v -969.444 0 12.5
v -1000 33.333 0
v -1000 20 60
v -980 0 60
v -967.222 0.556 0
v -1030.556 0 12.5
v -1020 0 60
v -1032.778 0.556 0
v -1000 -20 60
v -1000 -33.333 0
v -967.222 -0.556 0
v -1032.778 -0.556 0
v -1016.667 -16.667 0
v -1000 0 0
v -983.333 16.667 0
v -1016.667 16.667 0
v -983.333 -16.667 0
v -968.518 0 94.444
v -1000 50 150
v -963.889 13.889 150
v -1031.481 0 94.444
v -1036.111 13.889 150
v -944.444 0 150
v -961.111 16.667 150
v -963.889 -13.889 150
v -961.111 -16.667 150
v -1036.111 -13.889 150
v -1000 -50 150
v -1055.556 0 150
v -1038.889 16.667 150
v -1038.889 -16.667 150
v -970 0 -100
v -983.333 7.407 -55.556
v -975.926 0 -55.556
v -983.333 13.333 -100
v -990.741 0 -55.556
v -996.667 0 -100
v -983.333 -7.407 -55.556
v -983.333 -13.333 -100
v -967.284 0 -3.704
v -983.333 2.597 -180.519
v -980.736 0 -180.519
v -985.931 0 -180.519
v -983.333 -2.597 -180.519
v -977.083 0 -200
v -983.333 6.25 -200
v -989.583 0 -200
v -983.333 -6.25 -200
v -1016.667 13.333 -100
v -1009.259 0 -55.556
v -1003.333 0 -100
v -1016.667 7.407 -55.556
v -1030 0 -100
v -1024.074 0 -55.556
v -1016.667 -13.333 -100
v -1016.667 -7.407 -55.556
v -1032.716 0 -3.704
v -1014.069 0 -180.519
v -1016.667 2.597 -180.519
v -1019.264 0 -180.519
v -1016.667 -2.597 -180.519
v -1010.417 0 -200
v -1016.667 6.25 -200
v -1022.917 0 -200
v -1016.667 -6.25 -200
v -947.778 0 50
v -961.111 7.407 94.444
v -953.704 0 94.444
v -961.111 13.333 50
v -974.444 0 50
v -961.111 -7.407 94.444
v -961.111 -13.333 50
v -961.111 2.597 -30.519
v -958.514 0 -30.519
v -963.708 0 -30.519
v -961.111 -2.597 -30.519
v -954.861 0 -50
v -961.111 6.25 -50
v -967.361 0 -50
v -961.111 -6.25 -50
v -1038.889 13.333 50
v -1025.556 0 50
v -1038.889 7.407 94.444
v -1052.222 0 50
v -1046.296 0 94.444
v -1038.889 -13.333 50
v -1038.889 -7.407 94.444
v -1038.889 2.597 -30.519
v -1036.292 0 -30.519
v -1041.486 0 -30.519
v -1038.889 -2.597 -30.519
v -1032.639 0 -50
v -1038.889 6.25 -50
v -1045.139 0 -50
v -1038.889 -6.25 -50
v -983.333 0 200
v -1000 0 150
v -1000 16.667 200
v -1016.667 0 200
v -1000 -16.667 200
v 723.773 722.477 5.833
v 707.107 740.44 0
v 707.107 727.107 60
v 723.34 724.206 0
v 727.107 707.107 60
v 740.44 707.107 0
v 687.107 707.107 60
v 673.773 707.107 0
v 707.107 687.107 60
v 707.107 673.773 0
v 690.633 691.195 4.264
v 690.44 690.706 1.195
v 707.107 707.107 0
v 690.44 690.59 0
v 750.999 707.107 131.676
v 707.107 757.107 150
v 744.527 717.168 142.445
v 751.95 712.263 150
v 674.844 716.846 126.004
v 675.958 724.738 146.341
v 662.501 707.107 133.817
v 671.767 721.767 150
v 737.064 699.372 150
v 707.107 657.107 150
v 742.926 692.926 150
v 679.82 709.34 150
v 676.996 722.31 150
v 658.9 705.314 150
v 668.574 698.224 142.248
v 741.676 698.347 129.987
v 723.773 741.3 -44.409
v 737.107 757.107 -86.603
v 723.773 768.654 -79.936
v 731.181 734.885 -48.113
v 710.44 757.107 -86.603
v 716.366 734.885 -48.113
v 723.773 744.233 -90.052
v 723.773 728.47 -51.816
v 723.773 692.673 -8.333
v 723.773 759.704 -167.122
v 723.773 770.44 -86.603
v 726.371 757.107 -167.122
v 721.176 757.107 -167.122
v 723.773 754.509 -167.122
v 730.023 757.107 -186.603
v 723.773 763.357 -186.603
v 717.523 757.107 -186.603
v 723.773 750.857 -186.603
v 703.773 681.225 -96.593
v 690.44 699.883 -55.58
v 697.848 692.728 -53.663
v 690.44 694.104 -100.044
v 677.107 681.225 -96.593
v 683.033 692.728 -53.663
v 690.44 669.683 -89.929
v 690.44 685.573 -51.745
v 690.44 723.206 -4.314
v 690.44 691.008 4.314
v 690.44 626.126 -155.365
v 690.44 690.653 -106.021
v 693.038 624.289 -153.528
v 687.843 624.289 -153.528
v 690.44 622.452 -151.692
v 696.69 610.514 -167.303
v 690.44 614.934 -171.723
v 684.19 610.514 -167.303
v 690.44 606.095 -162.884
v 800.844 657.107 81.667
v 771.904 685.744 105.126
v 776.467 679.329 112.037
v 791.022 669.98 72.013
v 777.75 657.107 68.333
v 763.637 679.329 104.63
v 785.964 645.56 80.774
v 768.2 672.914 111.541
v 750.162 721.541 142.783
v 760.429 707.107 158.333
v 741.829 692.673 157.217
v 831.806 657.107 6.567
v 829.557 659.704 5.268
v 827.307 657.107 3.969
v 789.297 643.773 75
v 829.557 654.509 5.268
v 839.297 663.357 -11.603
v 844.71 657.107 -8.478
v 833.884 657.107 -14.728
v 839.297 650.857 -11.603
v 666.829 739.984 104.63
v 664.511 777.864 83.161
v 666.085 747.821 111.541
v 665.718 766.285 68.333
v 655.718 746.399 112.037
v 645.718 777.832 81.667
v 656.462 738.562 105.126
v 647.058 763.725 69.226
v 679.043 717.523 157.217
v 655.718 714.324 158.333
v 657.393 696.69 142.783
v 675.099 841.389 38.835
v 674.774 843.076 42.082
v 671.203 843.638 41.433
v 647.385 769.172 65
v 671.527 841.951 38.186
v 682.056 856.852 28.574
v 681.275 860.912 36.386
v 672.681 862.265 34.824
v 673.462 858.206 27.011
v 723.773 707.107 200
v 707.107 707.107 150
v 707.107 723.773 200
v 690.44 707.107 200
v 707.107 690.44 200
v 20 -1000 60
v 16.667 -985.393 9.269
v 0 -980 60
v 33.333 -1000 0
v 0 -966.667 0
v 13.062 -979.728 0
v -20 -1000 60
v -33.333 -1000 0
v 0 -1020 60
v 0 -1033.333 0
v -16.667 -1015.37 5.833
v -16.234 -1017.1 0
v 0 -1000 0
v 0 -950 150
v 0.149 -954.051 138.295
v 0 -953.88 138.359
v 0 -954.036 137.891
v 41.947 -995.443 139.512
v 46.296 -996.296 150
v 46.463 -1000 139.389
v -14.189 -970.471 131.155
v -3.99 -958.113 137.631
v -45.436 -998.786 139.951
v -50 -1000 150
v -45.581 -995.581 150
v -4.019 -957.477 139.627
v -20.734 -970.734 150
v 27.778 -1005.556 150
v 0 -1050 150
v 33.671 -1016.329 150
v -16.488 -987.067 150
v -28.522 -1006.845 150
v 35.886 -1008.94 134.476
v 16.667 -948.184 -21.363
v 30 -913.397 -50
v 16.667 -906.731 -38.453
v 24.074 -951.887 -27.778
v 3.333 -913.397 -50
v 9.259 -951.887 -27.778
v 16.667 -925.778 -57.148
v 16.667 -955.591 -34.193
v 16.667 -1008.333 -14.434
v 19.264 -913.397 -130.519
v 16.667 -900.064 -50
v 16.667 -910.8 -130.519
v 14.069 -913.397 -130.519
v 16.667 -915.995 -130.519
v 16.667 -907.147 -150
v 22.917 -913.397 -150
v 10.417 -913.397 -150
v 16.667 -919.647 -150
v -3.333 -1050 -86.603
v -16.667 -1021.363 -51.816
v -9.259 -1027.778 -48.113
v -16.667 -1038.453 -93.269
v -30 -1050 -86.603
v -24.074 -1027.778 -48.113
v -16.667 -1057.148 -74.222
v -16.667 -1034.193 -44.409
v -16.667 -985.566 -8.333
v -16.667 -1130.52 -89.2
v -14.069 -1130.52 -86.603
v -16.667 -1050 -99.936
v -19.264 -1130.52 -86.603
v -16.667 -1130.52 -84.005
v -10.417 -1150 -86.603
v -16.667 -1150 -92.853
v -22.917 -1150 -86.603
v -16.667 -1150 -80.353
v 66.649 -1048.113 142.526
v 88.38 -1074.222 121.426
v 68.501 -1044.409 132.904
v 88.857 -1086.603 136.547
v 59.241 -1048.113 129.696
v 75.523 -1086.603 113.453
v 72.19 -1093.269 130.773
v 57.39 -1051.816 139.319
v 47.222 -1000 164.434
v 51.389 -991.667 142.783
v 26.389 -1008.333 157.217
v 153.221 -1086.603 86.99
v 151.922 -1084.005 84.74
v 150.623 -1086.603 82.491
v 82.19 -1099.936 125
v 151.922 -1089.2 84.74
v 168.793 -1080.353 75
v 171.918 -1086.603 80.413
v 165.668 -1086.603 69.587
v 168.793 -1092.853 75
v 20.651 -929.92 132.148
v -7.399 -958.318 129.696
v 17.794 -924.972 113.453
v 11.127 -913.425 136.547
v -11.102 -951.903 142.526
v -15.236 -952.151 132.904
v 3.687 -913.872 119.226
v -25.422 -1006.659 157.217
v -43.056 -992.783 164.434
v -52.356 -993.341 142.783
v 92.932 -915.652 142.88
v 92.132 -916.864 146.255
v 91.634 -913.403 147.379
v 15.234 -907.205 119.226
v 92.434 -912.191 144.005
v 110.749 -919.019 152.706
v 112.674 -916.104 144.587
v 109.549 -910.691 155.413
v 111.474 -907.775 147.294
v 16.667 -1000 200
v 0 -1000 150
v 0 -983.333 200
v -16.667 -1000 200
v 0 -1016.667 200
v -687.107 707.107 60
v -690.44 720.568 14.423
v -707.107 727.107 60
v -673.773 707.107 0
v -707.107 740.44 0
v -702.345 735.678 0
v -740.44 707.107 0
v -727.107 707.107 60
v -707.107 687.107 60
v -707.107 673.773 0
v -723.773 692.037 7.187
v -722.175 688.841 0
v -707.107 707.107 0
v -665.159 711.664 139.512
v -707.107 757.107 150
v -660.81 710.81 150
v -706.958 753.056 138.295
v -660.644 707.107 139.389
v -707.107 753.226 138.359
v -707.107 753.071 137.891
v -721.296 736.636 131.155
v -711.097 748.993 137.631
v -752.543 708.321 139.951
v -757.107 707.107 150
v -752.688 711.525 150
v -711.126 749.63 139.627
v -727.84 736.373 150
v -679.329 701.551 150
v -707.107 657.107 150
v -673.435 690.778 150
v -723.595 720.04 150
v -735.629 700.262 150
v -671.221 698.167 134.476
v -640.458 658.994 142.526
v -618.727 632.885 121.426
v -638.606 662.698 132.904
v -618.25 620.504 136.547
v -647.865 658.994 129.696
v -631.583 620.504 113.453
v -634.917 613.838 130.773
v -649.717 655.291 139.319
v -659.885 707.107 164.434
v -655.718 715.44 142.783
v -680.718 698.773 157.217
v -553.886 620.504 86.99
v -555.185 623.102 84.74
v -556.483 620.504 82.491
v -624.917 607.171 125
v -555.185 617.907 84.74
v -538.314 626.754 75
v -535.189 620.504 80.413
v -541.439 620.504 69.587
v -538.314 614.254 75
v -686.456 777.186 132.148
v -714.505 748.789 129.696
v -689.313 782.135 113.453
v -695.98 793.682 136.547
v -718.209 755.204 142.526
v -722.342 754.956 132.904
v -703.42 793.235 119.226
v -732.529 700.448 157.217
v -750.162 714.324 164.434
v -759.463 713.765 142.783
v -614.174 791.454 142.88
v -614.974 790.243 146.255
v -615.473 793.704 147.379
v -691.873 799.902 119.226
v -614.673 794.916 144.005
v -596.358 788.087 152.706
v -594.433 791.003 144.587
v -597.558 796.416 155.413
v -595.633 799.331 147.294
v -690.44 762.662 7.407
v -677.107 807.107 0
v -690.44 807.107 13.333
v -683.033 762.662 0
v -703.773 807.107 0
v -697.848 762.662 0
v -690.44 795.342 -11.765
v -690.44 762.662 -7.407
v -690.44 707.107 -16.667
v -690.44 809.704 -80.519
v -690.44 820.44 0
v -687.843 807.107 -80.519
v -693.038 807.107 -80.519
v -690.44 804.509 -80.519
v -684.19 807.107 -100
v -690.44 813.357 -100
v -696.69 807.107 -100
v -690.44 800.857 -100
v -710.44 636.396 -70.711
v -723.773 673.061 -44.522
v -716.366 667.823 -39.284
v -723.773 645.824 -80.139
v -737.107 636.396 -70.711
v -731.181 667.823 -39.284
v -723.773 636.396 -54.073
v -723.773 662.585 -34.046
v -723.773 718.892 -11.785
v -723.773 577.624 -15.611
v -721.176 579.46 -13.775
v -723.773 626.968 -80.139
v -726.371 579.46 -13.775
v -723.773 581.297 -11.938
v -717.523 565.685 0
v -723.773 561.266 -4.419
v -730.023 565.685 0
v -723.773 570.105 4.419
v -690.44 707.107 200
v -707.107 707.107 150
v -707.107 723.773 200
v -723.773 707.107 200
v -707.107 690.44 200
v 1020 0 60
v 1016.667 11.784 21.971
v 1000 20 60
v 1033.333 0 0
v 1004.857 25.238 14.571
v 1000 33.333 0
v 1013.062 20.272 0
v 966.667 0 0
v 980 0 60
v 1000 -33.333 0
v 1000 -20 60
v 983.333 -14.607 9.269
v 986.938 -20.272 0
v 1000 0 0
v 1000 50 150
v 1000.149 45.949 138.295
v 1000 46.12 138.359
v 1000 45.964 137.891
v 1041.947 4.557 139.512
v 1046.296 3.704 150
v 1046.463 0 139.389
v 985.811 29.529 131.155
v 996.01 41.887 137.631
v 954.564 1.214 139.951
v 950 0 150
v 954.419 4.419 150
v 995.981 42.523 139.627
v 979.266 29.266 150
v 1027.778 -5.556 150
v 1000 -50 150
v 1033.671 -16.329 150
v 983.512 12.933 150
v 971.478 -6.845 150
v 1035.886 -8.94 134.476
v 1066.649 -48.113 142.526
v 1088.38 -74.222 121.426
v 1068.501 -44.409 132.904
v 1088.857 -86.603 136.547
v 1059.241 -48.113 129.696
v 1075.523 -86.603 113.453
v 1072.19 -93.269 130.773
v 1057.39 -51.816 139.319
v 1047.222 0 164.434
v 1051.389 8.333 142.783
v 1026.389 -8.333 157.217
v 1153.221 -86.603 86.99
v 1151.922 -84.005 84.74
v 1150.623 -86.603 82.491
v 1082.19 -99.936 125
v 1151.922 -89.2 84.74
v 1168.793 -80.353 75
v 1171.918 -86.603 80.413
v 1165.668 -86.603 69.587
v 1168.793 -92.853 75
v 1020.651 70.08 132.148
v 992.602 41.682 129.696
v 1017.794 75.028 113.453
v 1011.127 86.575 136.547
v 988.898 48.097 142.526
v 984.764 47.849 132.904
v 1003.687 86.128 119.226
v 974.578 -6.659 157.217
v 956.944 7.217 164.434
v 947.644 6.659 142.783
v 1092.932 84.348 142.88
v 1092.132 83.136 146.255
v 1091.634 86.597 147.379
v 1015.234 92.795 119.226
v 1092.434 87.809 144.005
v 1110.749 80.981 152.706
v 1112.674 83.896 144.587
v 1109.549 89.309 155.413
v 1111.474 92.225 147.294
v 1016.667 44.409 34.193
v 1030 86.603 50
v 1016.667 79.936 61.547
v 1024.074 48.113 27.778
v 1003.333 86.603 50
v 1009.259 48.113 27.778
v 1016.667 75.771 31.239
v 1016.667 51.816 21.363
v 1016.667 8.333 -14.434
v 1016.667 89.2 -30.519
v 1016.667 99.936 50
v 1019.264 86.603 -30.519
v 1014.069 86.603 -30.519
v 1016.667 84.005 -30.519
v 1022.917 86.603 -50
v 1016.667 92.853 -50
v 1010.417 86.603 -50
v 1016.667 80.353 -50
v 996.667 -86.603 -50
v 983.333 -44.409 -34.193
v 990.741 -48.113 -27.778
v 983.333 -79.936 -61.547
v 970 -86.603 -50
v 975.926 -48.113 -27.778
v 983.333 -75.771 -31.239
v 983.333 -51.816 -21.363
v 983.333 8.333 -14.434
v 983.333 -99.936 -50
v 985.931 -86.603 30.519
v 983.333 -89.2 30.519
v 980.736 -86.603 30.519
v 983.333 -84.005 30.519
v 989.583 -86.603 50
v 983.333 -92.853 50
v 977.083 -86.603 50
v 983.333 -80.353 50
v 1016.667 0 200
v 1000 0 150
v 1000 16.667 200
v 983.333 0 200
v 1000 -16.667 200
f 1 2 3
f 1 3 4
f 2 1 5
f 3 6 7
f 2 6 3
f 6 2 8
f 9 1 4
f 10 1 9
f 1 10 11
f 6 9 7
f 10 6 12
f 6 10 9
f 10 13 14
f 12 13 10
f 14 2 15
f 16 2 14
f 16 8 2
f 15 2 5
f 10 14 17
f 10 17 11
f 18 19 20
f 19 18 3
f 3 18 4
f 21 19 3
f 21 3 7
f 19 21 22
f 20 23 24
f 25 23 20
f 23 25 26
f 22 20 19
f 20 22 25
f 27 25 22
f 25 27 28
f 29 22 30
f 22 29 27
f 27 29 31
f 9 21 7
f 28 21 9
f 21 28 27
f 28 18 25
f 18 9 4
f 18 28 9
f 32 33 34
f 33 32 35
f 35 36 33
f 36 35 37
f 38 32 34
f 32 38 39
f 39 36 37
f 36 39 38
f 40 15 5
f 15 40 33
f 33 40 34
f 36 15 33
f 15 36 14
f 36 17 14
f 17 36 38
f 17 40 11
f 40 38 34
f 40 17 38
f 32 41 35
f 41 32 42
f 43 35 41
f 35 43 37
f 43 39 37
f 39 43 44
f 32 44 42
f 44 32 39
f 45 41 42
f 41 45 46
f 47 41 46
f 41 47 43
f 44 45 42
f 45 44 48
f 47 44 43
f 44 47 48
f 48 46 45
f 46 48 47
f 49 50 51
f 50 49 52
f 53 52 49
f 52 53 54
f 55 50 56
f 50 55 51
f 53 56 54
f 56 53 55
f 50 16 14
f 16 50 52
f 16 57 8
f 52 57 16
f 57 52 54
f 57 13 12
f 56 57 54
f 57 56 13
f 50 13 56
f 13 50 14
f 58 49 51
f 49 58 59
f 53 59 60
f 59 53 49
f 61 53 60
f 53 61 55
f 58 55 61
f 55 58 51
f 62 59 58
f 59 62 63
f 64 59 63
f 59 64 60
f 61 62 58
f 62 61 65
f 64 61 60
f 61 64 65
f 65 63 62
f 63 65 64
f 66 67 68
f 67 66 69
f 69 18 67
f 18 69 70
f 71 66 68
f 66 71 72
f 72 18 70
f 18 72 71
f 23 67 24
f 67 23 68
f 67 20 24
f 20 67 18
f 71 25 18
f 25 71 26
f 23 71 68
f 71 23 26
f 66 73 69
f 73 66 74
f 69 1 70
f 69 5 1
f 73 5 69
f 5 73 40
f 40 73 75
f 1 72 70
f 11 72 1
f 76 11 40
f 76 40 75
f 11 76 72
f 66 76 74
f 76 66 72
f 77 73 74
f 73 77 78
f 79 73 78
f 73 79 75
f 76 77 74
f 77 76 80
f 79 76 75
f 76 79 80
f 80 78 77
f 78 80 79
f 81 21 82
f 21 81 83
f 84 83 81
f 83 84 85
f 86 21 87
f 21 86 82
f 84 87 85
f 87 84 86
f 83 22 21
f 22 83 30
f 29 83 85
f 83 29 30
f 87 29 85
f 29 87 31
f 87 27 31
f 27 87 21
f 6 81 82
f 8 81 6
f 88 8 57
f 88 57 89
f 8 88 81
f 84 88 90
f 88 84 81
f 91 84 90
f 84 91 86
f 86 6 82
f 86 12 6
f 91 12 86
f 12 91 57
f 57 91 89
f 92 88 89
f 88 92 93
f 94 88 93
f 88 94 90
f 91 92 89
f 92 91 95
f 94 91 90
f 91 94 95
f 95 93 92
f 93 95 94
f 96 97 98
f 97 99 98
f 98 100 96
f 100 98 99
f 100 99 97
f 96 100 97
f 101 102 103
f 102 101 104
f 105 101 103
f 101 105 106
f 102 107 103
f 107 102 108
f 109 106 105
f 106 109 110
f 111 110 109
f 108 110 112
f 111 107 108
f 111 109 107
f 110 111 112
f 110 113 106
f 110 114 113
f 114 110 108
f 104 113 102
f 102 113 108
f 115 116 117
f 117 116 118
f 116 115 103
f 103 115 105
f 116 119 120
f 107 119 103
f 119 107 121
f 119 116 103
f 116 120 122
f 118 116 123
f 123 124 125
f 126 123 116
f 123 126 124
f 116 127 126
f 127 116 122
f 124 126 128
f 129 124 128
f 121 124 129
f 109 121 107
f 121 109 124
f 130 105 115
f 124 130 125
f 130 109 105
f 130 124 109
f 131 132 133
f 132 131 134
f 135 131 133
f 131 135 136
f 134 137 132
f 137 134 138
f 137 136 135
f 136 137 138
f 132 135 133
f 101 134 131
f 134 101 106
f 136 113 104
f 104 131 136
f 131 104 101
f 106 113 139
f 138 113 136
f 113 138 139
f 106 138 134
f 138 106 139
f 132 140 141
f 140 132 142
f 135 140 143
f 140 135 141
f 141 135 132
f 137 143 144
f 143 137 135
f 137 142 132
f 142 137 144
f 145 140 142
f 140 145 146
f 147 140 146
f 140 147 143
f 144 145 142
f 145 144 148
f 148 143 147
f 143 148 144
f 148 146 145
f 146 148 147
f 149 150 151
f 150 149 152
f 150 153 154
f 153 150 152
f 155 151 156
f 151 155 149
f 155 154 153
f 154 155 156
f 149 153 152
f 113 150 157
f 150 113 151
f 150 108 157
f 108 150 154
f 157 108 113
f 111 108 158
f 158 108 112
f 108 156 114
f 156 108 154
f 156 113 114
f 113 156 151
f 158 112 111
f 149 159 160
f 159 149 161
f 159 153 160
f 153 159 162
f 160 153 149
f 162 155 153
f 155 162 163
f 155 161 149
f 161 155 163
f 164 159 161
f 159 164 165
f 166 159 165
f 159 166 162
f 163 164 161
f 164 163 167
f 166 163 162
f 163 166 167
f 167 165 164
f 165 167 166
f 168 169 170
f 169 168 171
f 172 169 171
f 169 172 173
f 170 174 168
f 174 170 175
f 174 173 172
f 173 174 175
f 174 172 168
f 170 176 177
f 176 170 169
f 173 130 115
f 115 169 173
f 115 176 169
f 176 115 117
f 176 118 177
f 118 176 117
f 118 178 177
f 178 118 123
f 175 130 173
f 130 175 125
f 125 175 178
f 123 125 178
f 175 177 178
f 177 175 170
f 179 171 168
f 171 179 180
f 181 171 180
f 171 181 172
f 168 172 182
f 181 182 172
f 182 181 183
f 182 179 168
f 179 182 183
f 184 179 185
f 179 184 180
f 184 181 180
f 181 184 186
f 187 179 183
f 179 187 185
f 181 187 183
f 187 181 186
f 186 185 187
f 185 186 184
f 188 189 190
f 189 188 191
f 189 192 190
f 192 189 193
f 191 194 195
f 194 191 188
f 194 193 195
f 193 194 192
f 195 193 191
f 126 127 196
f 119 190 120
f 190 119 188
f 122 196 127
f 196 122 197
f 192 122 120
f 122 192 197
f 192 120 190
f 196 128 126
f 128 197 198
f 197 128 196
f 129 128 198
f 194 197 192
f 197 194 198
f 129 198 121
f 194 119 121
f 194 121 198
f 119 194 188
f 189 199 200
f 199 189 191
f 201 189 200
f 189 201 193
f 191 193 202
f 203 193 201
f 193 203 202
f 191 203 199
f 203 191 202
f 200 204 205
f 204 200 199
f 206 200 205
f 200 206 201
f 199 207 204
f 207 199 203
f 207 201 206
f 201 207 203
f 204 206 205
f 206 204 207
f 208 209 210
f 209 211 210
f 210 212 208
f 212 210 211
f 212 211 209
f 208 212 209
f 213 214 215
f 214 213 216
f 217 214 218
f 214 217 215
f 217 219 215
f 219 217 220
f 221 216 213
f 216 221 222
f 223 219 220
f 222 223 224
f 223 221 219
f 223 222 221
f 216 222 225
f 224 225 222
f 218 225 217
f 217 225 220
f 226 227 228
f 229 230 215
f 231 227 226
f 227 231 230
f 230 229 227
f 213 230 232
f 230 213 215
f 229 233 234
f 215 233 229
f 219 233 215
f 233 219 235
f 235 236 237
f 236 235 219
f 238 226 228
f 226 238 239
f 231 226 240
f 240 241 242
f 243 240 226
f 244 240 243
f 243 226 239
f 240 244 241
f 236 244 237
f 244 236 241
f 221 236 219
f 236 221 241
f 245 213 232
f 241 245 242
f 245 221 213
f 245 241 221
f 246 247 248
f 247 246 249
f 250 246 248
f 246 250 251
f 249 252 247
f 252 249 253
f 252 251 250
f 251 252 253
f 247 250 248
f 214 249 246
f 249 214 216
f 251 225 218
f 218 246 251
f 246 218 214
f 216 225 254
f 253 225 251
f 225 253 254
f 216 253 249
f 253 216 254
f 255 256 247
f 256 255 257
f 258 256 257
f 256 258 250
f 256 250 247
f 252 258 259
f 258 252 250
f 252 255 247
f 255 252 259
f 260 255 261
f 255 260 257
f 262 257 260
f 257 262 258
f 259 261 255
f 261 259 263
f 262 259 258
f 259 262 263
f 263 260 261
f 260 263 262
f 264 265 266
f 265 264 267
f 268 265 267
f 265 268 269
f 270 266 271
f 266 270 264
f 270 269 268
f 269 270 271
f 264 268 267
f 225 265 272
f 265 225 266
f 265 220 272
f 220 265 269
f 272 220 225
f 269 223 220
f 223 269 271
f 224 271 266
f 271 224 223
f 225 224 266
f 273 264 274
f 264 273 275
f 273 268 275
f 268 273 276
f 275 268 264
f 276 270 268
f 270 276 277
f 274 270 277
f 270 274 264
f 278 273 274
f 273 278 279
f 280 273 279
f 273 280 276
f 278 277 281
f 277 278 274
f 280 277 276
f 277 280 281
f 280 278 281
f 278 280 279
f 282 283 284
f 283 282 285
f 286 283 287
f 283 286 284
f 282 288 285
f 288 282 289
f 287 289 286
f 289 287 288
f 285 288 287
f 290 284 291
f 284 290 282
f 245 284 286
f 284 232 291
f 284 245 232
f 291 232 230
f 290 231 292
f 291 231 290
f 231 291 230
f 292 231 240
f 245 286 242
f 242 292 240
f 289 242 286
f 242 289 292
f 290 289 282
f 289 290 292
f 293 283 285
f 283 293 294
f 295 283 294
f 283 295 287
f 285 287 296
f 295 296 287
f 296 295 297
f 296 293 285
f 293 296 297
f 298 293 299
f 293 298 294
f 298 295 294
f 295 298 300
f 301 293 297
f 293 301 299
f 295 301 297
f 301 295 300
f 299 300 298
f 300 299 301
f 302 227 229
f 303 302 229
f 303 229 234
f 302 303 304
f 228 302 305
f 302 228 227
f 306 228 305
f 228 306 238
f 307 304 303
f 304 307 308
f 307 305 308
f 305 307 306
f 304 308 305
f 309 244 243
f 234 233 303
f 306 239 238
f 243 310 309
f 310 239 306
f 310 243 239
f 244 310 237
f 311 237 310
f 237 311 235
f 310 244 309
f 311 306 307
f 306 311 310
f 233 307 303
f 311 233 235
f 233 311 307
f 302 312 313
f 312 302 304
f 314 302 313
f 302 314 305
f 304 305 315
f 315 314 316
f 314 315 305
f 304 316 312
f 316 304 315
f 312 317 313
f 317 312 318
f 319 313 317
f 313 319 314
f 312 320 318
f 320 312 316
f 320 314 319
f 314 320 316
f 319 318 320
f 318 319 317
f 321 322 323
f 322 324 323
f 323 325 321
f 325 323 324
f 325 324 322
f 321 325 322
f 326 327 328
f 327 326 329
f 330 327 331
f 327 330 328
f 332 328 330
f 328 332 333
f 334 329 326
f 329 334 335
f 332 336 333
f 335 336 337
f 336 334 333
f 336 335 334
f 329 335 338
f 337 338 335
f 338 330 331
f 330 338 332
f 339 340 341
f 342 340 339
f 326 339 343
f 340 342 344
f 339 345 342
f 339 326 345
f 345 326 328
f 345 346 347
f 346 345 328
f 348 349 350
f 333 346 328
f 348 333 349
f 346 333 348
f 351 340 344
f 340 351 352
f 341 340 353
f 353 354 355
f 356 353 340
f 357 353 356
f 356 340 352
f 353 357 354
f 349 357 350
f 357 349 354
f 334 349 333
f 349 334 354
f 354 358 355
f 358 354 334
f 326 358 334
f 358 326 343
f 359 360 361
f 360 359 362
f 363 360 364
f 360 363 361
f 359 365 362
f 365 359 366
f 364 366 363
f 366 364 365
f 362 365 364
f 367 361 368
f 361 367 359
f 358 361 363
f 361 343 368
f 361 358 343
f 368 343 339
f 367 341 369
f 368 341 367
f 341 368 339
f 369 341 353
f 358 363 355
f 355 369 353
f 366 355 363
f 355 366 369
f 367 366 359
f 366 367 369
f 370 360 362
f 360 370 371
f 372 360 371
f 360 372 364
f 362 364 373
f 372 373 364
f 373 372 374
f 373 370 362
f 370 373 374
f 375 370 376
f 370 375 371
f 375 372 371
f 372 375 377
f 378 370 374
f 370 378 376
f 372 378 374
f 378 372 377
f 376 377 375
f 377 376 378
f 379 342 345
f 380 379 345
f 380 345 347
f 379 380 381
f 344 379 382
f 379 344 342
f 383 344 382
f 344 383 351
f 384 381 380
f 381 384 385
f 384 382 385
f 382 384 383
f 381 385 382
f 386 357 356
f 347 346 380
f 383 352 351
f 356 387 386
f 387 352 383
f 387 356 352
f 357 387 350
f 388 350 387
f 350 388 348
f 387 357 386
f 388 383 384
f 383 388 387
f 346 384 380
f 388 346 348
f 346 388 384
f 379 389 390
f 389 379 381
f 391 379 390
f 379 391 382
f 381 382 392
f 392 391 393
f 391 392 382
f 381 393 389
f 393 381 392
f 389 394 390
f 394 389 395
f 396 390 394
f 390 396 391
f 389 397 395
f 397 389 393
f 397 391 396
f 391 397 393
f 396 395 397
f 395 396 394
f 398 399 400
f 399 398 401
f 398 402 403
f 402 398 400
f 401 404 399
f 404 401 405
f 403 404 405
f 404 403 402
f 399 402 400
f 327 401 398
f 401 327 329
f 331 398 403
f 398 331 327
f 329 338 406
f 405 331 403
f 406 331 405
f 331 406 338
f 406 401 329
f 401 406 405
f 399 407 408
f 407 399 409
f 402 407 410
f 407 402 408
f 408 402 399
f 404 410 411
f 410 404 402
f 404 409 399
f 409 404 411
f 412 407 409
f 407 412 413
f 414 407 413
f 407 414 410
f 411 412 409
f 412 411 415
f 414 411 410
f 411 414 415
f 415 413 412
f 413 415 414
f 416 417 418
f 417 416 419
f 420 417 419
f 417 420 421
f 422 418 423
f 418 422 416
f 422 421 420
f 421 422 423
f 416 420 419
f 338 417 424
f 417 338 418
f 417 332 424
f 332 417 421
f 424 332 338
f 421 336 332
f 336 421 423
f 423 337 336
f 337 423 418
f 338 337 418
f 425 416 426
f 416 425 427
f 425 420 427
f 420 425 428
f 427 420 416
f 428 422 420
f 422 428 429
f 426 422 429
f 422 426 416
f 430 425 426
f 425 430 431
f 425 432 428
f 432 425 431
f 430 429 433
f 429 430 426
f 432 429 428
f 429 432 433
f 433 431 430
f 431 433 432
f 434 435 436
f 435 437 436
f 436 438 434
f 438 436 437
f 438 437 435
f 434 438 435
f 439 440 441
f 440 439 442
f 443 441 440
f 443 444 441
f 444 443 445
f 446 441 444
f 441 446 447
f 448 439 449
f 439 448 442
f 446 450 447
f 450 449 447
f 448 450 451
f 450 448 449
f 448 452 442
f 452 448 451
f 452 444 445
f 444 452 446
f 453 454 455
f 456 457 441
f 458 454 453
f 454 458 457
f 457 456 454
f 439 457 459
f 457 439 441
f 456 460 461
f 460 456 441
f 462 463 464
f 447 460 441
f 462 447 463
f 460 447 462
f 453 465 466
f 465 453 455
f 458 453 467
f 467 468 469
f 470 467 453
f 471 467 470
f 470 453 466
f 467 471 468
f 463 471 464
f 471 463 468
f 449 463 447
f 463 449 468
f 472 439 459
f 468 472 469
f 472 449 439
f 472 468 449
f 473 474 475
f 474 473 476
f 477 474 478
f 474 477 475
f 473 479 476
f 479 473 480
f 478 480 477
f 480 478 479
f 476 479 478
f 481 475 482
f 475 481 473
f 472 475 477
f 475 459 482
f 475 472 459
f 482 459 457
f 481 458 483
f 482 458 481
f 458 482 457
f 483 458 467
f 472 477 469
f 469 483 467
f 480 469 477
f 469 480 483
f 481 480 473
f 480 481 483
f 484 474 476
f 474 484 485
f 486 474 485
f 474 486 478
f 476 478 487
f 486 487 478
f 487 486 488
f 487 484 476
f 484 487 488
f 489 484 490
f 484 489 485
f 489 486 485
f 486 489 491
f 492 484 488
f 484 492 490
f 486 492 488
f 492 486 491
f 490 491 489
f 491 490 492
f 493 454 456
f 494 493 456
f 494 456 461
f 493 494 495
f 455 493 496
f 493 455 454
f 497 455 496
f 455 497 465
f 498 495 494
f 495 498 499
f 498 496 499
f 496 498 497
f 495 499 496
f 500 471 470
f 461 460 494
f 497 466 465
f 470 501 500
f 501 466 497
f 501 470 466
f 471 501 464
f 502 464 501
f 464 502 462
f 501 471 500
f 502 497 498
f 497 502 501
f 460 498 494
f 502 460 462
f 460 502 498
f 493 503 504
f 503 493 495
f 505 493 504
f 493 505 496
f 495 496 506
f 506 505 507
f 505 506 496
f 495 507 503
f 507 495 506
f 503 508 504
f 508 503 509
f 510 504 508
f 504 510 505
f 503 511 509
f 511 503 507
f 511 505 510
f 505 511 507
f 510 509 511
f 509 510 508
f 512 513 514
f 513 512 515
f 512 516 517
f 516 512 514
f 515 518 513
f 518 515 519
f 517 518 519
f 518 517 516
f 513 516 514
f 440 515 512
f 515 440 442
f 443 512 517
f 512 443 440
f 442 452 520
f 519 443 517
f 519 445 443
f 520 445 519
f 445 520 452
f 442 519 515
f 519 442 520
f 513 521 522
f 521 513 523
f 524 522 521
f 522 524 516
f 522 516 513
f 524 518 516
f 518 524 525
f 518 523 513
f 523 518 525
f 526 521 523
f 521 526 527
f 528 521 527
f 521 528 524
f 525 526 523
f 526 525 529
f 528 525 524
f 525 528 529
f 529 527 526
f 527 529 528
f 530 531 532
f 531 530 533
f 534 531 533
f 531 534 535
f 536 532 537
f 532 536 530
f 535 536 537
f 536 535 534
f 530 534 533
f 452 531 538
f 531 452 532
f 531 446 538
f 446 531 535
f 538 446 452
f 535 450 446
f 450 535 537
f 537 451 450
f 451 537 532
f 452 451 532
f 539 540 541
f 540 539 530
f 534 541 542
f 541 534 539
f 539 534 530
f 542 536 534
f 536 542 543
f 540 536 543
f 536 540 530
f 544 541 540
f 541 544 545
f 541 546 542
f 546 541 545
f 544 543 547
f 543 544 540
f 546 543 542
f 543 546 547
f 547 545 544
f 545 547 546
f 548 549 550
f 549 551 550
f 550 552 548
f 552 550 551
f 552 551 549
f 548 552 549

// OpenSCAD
// RUNNER.SCAD - Draws a running figure (Figure wireframes for art projects)
//
// Since 2021
//
// v   = velocity or the degree of flexion of the joints of arms and legs (extremities)
// len = length
// wid = width
//

len_head        = 50;
len_upper_arm   = len_head * 2;
len_lower_arm   = len_head * 2;
len_upper_leg   = len_head * 2;
len_lower_leg   = len_head * 2;
len_torso       = len_head * 3;
len_foot        = len_head;
len_hand        = len_head / 1.5;

wid_head        = len_head * 2/3;
wid_upper_torso = len_head * 2;
wid_lower_torso = wid_head * 2;
wid_upper_arm   = wid_head / 1.5;
wid_lower_arm   = wid_head / 2;
wid_upper_leg   = wid_lower_torso / 2;
wid_lower_leg   = wid_upper_leg / 1.25;
wid_foot        = len_head * 1/4;
wid_hand        = len_head * 1/4;


module pyramid( l, w )
{
	cylinder( l, w/2, 0, $fn=4 );
}

module head()
{
	translate([ 0, 0, len_head ])
		mirror([ 0, 0, -1 ]) 
			pyramid( len_head, wid_head );
}

module torso()
{
	pyramid( len_torso, wid_lower_torso );
	translate([ 0, 0, len_torso ])
		mirror([ 0, 0, -1 ]) 
			pyramid( len_torso, wid_upper_torso );
}

module upper_extremity( len_upper, wid_lower, wid_upper )
{
	pyramid( len_upper, wid_lower );
	translate([ 0, 0, len_upper ])
		mirror([ 0, 0, -1 ]) 
			pyramid( len_upper, wid_upper );
}

module lower_extremity( len_lower, wid_lower )
{
	mirror([ 0, 0, -1 ]) 
		pyramid( len_lower, wid_lower );
	translate([ 0, 0, -len_lower ])
		pyramid( len_hand, wid_hand );  // Foot or hand
}

module extremity( v )
{
	translate([ 0, 0, -len_upper_leg ])
	{
		upper_extremity( len_upper_leg, wid_lower_leg, wid_upper_leg );
		rotate([ v, 0, 0 ])
			lower_extremity( len_lower_leg, wid_lower_leg );
	}
}

module figure( v )
{
	torso();
	
	v_leg = min( 120, v );  // Do flex joints too much 
	v_arm = min(  60, v );  // Do not pierce own body
	
	translate([ 0, 0, len_torso ]) 
		head();
	
	translate([ wid_upper_leg/2, 0, 0 ]) 
		rotate([ v_leg, 0, 0 ])
			extremity( -v_leg );
	
	translate([ -wid_upper_leg/2, 0, 0 ])
		rotate([ -v_leg + (v_leg/2), 0, 0 ])
			extremity( -v_leg );
	
	translate([ wid_upper_torso/2 - wid_upper_arm/2, 0, len_torso ]) 
		rotate([ -v_arm, -v_arm, 0 ])
			extremity( v_arm );
	
	translate([ -wid_upper_torso/2 + wid_upper_arm/2, 0, len_torso ]) 
		rotate([ v_arm, v_arm, -v_arm])
			extremity( v_arm );
}



// Draw a num of figures at once:
//
path_radius = 1000;
v_max       = 130;
v_step      = 30;
num         = v_max/v_step + 1;

for( i = [0 : v_step : v_max] )
{
	translate([ -path_radius * cos( i * (360 / num )), -path_radius * sin( i * (360 / num )), 0 ])
		figure( i );
}
